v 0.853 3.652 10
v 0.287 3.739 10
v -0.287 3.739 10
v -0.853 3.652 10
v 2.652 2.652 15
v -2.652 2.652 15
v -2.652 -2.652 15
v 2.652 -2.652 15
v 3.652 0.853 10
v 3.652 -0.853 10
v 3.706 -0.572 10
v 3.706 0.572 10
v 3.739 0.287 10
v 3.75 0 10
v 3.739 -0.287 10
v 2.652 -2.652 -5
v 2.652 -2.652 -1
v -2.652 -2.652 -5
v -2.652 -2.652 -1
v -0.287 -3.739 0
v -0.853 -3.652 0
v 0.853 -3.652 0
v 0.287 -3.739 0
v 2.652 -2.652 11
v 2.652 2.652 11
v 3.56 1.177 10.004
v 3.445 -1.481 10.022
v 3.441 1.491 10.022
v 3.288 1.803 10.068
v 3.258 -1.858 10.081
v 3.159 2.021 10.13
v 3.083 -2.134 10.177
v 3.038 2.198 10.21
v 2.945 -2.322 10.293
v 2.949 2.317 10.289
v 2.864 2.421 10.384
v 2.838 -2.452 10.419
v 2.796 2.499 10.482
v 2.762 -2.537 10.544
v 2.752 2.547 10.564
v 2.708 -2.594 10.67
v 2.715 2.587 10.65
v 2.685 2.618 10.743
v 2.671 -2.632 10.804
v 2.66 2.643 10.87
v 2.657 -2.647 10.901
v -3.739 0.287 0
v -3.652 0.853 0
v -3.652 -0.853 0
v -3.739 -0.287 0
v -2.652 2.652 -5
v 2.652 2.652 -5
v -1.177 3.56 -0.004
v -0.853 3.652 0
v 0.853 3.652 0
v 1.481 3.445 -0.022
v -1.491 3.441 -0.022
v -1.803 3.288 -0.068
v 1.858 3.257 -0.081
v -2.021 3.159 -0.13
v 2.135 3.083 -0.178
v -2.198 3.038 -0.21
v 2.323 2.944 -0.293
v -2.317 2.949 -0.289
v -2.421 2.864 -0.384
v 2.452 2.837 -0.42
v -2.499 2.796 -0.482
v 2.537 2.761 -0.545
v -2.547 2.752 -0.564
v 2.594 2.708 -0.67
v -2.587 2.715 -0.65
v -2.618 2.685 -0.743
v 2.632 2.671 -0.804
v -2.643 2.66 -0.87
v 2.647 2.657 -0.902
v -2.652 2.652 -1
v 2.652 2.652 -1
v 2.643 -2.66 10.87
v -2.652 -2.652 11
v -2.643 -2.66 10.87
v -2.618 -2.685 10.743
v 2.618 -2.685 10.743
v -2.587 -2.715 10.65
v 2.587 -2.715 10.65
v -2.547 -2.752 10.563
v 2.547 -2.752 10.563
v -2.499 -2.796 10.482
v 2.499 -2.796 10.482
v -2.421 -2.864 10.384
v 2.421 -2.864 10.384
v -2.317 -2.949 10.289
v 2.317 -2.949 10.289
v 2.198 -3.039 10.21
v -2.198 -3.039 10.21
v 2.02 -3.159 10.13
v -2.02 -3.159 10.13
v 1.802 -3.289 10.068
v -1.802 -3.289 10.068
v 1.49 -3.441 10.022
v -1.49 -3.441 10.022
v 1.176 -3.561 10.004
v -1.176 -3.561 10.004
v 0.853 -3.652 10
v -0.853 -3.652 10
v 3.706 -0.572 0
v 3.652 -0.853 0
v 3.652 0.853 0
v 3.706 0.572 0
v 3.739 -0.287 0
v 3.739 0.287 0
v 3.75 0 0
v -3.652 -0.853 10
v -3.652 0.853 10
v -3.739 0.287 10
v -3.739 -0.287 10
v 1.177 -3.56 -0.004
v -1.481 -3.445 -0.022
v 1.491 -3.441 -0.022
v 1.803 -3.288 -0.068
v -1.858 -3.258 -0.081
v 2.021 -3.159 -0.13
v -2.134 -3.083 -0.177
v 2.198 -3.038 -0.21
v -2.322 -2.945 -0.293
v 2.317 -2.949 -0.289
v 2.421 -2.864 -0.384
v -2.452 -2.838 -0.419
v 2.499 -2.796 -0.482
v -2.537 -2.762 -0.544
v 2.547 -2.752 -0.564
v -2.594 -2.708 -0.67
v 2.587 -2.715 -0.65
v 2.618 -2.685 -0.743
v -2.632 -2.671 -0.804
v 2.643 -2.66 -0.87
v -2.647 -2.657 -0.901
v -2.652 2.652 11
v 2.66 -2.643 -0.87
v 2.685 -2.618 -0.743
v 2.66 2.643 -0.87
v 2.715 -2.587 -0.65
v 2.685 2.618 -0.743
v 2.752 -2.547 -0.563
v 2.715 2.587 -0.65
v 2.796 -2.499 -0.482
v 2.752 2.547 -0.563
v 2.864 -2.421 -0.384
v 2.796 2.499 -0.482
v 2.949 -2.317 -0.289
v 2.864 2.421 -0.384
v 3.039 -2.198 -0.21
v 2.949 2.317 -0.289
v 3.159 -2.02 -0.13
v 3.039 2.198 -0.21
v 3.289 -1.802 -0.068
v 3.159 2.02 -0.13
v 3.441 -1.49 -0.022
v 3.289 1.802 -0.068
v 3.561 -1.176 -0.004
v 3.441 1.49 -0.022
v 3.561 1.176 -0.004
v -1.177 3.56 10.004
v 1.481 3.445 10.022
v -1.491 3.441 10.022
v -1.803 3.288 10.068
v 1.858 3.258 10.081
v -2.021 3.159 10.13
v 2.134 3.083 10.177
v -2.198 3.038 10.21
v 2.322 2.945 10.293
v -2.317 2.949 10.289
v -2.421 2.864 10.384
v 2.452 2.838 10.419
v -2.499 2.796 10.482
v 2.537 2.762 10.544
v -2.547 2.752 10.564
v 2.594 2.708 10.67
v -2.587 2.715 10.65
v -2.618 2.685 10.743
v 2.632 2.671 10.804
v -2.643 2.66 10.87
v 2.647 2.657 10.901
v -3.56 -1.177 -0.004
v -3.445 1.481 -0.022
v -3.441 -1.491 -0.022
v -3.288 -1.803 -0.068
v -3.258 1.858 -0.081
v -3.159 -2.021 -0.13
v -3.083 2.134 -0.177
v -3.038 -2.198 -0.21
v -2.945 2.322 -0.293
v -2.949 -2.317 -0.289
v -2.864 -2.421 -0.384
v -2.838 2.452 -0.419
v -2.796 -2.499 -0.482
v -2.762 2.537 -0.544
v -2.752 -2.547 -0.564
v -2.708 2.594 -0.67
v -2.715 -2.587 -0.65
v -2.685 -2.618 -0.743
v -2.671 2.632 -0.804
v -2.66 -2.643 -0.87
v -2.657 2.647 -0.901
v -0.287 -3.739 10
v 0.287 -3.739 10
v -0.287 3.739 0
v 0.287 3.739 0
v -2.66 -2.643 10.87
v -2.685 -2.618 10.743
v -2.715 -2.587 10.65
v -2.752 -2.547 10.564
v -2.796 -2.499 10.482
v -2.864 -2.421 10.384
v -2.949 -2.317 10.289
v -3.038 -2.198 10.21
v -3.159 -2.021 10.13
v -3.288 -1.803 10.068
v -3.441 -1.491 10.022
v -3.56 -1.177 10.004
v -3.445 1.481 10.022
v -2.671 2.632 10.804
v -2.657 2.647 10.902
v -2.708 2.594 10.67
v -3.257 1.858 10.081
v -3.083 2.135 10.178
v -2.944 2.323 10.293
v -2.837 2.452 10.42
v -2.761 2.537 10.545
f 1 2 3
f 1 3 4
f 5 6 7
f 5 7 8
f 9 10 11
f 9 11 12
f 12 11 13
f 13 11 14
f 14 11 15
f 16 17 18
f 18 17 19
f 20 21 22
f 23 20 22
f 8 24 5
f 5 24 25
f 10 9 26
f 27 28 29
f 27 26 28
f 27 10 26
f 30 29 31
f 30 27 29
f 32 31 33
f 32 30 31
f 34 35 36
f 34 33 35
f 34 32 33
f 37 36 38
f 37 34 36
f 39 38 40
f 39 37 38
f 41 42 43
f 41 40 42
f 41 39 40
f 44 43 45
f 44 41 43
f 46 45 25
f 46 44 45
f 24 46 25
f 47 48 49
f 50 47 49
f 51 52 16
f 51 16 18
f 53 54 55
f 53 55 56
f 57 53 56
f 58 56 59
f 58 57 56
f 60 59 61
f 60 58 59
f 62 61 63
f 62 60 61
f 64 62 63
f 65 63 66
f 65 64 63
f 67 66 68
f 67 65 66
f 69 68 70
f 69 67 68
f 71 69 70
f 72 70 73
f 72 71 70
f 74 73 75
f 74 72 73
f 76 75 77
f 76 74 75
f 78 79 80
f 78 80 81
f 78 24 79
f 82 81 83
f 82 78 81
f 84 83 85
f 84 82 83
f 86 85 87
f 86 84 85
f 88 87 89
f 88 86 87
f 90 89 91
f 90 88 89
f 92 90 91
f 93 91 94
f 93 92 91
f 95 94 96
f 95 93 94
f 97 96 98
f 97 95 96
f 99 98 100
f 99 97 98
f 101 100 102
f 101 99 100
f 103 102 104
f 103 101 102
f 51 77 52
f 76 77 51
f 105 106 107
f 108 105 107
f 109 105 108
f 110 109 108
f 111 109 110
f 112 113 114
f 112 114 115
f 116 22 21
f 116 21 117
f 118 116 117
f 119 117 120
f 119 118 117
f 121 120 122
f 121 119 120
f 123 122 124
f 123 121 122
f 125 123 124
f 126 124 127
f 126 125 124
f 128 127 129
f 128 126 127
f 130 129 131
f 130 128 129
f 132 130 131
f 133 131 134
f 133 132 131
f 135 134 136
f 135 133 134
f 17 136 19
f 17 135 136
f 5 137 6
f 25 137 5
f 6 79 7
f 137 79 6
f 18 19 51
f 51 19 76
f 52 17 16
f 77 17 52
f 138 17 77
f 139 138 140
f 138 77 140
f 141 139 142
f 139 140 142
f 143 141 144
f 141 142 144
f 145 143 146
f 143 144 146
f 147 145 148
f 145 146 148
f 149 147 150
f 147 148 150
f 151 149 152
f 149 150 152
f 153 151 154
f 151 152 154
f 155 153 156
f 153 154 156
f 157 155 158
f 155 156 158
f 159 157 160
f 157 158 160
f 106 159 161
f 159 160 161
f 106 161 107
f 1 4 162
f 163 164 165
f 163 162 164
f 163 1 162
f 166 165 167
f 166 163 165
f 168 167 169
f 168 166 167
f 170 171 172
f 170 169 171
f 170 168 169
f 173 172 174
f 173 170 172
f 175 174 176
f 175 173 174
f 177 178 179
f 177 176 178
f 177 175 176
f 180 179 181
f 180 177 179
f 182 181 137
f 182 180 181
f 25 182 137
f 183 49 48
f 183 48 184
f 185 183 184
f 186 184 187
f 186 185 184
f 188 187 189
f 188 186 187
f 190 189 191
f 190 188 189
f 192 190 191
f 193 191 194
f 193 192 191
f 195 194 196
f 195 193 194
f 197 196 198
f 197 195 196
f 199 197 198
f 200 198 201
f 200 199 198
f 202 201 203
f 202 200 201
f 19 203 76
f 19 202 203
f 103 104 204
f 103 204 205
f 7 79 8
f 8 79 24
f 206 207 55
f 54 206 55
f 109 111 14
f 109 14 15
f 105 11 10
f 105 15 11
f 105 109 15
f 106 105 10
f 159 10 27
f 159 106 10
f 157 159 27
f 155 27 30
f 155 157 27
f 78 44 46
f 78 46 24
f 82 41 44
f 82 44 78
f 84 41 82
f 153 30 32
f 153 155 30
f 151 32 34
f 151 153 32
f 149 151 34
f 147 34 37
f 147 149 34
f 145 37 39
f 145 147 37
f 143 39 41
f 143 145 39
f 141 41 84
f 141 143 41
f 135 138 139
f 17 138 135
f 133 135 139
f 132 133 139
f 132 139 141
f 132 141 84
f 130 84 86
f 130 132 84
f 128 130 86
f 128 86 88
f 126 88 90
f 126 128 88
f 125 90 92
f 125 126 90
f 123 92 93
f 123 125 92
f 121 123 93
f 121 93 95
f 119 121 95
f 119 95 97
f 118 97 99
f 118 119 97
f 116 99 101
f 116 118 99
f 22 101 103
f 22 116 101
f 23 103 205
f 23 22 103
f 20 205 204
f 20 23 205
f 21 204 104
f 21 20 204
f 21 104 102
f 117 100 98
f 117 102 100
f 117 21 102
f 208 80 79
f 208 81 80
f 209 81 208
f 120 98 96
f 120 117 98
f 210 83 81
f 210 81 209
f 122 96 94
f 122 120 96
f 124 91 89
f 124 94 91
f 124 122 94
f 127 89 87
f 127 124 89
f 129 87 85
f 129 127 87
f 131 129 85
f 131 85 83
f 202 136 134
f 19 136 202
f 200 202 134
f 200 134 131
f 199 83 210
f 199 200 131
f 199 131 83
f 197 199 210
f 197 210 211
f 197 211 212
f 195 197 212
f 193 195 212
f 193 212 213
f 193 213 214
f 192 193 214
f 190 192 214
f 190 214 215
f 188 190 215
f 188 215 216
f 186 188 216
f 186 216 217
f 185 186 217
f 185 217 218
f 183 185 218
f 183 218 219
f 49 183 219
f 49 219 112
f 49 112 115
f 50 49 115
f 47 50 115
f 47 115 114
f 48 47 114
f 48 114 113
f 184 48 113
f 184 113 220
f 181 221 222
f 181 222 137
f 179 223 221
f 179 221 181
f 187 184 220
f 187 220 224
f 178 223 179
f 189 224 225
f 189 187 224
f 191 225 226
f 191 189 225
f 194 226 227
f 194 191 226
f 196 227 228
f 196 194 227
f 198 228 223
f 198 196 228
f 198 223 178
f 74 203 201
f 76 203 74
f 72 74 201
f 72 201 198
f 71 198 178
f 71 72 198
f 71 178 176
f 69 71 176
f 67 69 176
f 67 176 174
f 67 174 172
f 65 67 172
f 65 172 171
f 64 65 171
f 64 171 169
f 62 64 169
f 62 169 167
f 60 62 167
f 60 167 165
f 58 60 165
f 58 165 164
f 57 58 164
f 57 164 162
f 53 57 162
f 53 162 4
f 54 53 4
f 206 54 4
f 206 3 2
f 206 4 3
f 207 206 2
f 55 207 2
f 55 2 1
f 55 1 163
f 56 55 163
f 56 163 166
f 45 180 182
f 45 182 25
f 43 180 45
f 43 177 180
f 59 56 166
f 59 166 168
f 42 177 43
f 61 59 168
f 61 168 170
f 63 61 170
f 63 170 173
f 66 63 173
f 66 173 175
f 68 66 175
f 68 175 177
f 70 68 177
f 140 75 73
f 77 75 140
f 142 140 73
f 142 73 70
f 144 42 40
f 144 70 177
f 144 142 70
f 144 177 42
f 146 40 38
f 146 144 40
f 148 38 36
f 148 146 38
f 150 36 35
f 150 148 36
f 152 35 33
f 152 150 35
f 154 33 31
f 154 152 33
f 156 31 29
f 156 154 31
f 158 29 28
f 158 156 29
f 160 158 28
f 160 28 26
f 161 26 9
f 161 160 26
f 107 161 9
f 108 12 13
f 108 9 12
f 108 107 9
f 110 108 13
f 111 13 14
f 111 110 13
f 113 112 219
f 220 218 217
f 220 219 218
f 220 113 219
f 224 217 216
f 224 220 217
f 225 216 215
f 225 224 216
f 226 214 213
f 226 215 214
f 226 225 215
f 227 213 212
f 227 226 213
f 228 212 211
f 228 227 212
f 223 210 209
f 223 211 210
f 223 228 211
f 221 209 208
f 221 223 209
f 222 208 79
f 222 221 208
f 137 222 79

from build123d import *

# Parameters (mm, degrees)
SKETCH2_R           = 3.75
BOSS_EXTRUDE1_DEPTH = 10
SKETCH3_W           = 5.303300858
SKETCH3_H           = 5.303300858
BOSS_EXTRUDE2_DEPTH = 5
SKETCH4_W           = 5.303300858
SKETCH4_H           = 5.303300858
BOSS_EXTRUDE3_DEPTH = 5
FILLET1_R           = 1
FILLET3_R           = 1
FILLET4_R           = 1
FILLET5_R           = 1
FILLET6_R           = 1
FILLET7_R           = 1
FILLET8_R           = 1
FILLET9_R           = 1


with BuildPart() as part:
    # Sketch2 → Boss-Extrude1 (new body)
    with BuildSketch(Plane.XY):
        Circle(SKETCH2_R)
    extrude(amount=BOSS_EXTRUDE1_DEPTH)

    # Sketch3 → Boss-Extrude2 (add)
    with BuildSketch(Plane.XY.offset(10)):
        Rectangle(SKETCH3_W, SKETCH3_H)
    extrude(amount=BOSS_EXTRUDE2_DEPTH)

    # Sketch4 → Boss-Extrude3 (add)
    with BuildSketch(Plane(origin=(0, 0, 0), x_dir=(-1, 0, 0), z_dir=(0, 0, -1))):
        Rectangle(SKETCH4_W, SKETCH4_H)
    extrude(amount=BOSS_EXTRUDE3_DEPTH)

    # Fillet1
    # the kernel refuses this fillet: 1 mm, written as the material it adds along each edge
    with BuildSketch(Plane(origin=(-2.651650429, 2.651650429, 10), x_dir=(-1, 0, 0), z_dir=(0, -1, 0))) as fillet1_piece_1_section:
        with BuildLine():
            CenterArc((FILLET1_R, -FILLET1_R), FILLET1_R, 90, 90)
            Line((0, -FILLET1_R), (0, 0))
            Line((0, 0), (FILLET1_R, 0))
        make_face()
    fillet1_piece_1 = extrude(amount=5.303300859, mode=Mode.PRIVATE)
    fillet1_piece_1 = fillet1_piece_1 & Plane(origin=(0, 0, 10.241590104), x_dir=(1, 0, 0), z_dir=(0, 0, -1)) * Cylinder(3.75, 15, mode=Mode.PRIVATE)
    add(fillet1_piece_1)

    # Fillet3
    # the kernel refuses this fillet: 1 mm, written as the material it adds along each edge
    with BuildSketch(Plane(origin=(2.651650429, 2.651650429, 10), x_dir=(0, 0, 1), z_dir=(-1, 0, 0))) as fillet3_piece_1_section:
        with BuildLine():
            CenterArc((FILLET3_R, FILLET3_R), FILLET3_R, 180, 90)
            Line((0, FILLET3_R), (0, 0))
            Line((0, 0), (FILLET3_R, 0))
        make_face()
    fillet3_piece_1 = extrude(amount=7.803300859, mode=Mode.PRIVATE)
    fillet3_piece_1 = fillet3_piece_1 & Plane(origin=(0, 0, 10.24158994), x_dir=(1, 0, 0), z_dir=(0, 0, -1)) * Cylinder(3.75, 20, mode=Mode.PRIVATE)
    add(fillet3_piece_1)

    # Fillet4
    # the kernel refuses this fillet: 1 mm, written as the material it adds along each edge
    with BuildSketch(Plane(origin=(2.651650429, -2.651650429, 10), x_dir=(0, 0, 1), z_dir=(0, 1, 0))) as fillet4_piece_1_section:
        with BuildLine():
            CenterArc((FILLET4_R, FILLET4_R), FILLET4_R, 180, 90)
            Line((0, FILLET4_R), (0, 0))
            Line((0, 0), (FILLET4_R, 0))
        make_face()
    fillet4_piece_1 = extrude(amount=7.803300859, mode=Mode.PRIVATE)
    fillet4_piece_1 = fillet4_piece_1 & Plane(origin=(0, 0, 10.24158994), x_dir=(1, 0, 0), z_dir=(0, 0, -1)) * Cylinder(3.75, 20, mode=Mode.PRIVATE)
    add(fillet4_piece_1)

    # Fillet5
    fillet5_edges = [part.edges().sort_by_distance(p)[0] for p in [
        (0, -2.651650429, 10),
    ]]
    fillet(fillet5_edges, radius=FILLET5_R)

    # Fillet6
    # the kernel refuses this fillet: 1 mm, written as the material it adds along each edge
    with BuildSketch(Plane(origin=(-2.651650429, 2.651650429, 0), x_dir=(0, 1, 0), z_dir=(1, 0, 0))) as fillet6_piece_1_section:
        with BuildLine():
            CenterArc((FILLET6_R, -FILLET6_R), FILLET6_R, 90, 90)
            Line((0, -FILLET6_R), (0, 0))
            Line((0, 0), (FILLET6_R, 0))
        make_face()
    fillet6_piece_1 = extrude(amount=5.303300859, mode=Mode.PRIVATE)
    fillet6_piece_1 = fillet6_piece_1 & Plane(origin=(0, 0, -0.241590055), x_dir=(1, 0, 0), z_dir=(0, 0, -1)) * Cylinder(3.75, 15, mode=Mode.PRIVATE)
    add(fillet6_piece_1)

    # Fillet7
    # the kernel refuses this fillet: 1 mm, written as the material it adds along each edge
    with BuildSketch(Plane(origin=(-2.651650429, -2.651650429, 0), x_dir=(0, 0, -1), z_dir=(0, 1, 0))) as fillet7_piece_1_section:
        with BuildLine():
            CenterArc((FILLET7_R, FILLET7_R), FILLET7_R, 180, 90)
            Line((0, FILLET7_R), (0, 0))
            Line((0, 0), (FILLET7_R, 0))
        make_face()
    fillet7_piece_1 = extrude(amount=7.803300859, mode=Mode.PRIVATE)
    fillet7_piece_1 = fillet7_piece_1 & Plane(origin=(0, 0, -0.241590003), x_dir=(1, 0, 0), z_dir=(0, 0, -1)) * Cylinder(3.75, 20, mode=Mode.PRIVATE)
    add(fillet7_piece_1)

    # Fillet8
    # the kernel refuses this fillet: 1 mm, written as the material it adds along each edge
    with BuildSketch(Plane(origin=(2.651650429, -2.651650429, 0), x_dir=(0, 0, -1), z_dir=(-1, 0, 0))) as fillet8_piece_1_section:
        with BuildLine():
            CenterArc((FILLET8_R, FILLET8_R), FILLET8_R, 180, 90)
            Line((0, FILLET8_R), (0, 0))
            Line((0, 0), (FILLET8_R, 0))
        make_face()
    fillet8_piece_1 = extrude(amount=7.803300859, mode=Mode.PRIVATE)
    fillet8_piece_1 = fillet8_piece_1 & Plane(origin=(0, 0, -0.241589985), x_dir=(1, 0, 0), z_dir=(0, 0, -1)) * Cylinder(3.75, 20, mode=Mode.PRIVATE)
    add(fillet8_piece_1)

    # Fillet9
    fillet9_edges = [part.edges().sort_by_distance(p)[0] for p in [
        (2.651650429, 0, 0),
    ]]
    fillet(fillet9_edges, radius=FILLET9_R)


solid = part.part
